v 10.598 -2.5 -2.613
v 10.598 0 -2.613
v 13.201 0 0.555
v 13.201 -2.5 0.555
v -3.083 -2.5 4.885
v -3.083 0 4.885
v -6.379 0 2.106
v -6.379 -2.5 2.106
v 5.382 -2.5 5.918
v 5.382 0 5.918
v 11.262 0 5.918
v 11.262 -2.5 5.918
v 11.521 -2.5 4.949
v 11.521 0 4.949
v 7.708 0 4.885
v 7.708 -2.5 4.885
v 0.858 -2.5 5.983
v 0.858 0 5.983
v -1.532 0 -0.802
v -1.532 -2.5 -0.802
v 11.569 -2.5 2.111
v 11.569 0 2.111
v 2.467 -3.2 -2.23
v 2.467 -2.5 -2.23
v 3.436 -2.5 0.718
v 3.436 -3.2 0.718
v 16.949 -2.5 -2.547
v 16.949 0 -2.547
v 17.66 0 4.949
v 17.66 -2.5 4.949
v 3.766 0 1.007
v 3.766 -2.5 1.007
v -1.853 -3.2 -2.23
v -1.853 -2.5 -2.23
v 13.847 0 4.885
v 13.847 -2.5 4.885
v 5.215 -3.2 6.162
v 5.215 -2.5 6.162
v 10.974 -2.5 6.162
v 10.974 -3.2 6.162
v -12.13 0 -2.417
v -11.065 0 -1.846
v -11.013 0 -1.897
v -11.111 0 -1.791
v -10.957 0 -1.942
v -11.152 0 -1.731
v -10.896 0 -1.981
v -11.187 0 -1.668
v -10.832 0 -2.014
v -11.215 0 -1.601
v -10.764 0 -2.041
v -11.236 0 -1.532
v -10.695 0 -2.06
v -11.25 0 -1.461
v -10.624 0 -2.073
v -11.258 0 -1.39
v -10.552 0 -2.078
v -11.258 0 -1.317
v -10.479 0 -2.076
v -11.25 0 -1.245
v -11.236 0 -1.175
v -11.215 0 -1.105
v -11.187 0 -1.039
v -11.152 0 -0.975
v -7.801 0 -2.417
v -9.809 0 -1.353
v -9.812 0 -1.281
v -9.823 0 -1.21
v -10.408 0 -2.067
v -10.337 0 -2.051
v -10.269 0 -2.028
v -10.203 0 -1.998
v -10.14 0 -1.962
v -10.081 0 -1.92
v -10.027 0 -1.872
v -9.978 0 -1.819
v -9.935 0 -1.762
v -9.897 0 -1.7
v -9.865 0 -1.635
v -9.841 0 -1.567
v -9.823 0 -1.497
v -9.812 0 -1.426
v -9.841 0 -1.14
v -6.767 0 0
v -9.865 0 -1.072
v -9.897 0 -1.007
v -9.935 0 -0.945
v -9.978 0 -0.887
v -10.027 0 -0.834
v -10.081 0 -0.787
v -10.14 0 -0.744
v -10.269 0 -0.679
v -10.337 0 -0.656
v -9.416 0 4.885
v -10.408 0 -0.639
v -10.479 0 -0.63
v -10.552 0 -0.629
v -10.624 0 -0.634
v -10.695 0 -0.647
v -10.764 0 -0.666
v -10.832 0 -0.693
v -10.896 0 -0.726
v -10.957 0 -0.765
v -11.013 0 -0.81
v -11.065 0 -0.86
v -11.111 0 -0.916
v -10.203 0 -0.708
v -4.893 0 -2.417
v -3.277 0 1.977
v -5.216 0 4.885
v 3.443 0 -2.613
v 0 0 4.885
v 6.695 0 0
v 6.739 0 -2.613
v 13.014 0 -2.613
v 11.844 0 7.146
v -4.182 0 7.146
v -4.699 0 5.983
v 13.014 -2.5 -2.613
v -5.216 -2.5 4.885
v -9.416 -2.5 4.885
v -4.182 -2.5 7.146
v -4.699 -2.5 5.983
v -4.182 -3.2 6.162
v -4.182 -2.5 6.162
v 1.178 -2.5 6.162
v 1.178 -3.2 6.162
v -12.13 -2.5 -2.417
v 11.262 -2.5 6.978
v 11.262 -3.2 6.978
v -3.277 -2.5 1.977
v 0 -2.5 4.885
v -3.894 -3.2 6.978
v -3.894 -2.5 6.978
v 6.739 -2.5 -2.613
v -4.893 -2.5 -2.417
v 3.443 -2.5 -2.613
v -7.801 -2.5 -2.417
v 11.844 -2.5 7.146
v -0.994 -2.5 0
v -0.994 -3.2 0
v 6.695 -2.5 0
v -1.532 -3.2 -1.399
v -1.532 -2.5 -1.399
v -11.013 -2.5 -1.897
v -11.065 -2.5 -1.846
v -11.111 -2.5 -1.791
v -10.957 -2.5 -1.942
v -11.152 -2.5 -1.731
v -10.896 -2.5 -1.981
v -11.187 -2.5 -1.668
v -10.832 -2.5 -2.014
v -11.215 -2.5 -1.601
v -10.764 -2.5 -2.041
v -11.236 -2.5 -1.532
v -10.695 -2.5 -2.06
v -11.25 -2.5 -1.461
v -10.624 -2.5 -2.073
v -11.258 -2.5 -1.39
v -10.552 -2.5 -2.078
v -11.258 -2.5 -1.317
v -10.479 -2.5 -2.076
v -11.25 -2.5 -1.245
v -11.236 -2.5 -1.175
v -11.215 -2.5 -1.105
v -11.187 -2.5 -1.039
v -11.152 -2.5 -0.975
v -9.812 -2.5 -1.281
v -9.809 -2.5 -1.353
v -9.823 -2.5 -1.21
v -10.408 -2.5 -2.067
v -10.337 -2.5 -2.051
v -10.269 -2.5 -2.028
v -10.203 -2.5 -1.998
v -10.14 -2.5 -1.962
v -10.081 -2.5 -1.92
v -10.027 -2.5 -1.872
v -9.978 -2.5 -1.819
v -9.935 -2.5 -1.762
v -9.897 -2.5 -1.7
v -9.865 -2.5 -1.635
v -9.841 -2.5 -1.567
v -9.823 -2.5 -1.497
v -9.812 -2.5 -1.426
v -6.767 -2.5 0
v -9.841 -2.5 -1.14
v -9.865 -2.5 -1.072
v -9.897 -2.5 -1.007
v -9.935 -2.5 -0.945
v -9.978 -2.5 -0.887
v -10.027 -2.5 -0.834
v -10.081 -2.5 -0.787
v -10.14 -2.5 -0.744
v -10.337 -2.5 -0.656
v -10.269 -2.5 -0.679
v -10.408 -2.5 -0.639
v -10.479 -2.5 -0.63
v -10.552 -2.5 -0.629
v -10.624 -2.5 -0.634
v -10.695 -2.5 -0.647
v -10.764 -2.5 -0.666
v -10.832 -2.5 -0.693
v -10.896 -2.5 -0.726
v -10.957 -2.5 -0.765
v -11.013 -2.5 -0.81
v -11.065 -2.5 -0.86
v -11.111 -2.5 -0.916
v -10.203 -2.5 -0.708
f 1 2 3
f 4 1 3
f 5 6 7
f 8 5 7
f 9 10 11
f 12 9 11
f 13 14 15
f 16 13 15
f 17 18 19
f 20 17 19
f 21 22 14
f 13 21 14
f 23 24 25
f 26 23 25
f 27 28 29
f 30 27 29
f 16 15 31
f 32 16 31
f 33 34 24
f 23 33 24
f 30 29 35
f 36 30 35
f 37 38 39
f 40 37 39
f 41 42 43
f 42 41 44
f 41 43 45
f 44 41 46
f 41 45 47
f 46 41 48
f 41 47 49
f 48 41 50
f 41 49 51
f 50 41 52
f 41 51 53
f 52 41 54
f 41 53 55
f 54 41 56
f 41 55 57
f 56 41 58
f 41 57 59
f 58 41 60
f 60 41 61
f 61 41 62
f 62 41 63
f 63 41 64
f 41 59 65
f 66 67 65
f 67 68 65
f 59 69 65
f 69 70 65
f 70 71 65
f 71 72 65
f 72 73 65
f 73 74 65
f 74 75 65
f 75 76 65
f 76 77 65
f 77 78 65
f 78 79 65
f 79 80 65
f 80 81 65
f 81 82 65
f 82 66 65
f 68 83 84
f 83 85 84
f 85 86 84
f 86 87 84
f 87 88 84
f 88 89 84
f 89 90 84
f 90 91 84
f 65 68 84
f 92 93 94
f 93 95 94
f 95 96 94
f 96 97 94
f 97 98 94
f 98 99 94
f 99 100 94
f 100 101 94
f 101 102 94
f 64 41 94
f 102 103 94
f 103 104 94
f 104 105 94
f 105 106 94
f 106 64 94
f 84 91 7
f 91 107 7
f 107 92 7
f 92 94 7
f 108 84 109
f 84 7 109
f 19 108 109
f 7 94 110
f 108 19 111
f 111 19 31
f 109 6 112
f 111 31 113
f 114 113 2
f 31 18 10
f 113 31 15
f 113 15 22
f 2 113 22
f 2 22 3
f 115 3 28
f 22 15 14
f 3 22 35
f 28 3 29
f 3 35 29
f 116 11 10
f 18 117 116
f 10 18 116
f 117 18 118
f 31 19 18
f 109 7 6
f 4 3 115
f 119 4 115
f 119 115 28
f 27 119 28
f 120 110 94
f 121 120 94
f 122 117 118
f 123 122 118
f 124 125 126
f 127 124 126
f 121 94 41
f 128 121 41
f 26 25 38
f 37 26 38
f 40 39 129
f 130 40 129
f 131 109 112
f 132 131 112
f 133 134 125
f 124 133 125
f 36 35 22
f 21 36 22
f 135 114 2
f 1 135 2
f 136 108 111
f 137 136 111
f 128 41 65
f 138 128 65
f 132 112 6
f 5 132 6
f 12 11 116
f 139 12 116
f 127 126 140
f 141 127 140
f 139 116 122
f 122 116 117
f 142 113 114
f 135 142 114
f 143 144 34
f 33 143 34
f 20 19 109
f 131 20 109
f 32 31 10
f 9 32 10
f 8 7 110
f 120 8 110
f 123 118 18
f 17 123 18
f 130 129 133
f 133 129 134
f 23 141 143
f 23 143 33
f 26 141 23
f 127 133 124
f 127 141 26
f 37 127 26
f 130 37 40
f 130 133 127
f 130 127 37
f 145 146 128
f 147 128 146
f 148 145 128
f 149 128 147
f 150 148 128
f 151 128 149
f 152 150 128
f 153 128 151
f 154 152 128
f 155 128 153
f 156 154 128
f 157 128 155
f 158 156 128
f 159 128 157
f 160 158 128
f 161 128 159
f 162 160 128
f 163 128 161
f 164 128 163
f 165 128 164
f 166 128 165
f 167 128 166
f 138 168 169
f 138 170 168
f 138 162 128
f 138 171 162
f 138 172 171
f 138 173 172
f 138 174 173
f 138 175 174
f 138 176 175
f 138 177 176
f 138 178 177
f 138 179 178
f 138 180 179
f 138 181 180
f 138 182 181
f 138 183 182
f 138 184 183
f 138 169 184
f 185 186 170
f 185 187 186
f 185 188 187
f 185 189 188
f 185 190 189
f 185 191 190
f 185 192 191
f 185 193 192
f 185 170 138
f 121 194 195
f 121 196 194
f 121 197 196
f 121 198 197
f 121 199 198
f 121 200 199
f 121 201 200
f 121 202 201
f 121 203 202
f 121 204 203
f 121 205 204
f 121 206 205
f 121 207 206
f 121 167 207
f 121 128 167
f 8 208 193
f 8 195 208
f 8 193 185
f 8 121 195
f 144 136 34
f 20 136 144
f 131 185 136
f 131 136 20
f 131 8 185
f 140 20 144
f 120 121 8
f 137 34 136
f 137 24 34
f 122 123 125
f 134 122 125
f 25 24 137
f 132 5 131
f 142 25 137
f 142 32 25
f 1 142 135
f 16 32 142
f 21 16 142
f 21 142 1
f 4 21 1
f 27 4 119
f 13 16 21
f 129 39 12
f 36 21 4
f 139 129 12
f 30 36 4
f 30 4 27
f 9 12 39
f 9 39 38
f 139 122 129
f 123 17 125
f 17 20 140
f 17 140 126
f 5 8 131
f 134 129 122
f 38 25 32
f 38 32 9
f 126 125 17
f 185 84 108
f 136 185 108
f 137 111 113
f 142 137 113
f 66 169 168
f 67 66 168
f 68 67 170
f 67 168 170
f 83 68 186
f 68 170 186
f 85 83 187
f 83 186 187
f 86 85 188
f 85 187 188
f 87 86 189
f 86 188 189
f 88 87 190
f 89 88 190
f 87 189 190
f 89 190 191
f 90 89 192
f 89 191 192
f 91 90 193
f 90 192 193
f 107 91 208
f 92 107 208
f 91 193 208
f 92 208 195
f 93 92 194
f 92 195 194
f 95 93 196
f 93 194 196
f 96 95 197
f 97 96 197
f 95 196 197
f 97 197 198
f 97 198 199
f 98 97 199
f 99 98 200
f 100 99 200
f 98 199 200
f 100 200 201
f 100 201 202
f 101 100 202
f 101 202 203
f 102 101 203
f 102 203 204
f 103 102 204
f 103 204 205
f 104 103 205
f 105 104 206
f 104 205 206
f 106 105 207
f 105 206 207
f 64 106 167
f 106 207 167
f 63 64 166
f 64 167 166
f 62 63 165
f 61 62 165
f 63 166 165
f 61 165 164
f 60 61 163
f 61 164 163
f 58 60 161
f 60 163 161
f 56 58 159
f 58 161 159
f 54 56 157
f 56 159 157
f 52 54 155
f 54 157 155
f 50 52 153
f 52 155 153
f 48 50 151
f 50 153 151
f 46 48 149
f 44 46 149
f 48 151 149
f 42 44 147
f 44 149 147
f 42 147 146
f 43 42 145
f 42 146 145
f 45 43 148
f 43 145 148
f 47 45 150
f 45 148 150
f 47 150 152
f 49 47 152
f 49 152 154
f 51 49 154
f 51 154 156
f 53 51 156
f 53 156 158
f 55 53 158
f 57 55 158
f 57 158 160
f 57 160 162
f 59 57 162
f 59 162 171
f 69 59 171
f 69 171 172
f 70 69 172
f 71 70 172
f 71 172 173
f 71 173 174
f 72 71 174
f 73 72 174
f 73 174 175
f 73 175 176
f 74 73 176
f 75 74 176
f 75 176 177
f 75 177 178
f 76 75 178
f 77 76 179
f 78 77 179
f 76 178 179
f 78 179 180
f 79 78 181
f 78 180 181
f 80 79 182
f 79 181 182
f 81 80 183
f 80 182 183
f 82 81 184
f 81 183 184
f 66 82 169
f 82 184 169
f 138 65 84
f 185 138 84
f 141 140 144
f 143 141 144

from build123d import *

# Parameters (mm, degrees)
F1_DEPTH = 2.5
F2_R     = 0.7249372234
F3_DEPTH = 2.5
F5_DEPTH = 0.7


with BuildPart() as f1:
    # F0 (on Front) → F1 (new body)
    with BuildSketch(Plane.XZ):
        Polygon((-9.4160782173, 4.8845554702), (-12.13010028, -2.4174565915), (-7.8005888499, -2.4174565915), (-6.7666755058, 0), (-4.8927078024, -2.4174565915), (3.4432173707, -2.6133938689), (6.6945207968, 0), (6.7388154566, -2.6133938689), (10.5981117284, -2.6133938689), (13.2007738575, 0.5550436326), (13.0135210928, -2.6133938689), (16.9487092644, -2.5466959924), (17.65952399, 4.9491748214), (13.846969232, 4.8845554702), (11.5687668393, 2.1111098447), (11.5206642076, 4.9491748214), (7.7081094496, 4.8845554702), (3.7663155235, 1.0073808953), (5.3818048909, 5.9184683487), (11.2621868029, 5.9184683487), (11.8437623605, 7.1462406777), (-4.1818926111, 7.1462406777), (-4.6988492832, 5.9830881655), (0.8584343595, 5.9830881655), (-1.5324898995, -0.8019671077), (-3.277218435, 1.9766744226), (0, 4.8845554702), (-3.0833596829, 4.8845554702), (-6.3789580017, 2.1059135906), (-5.2158059552, 4.8845554702), align=None)
    extrude(amount=F1_DEPTH)

    # F2 (on face) → F3 (cut, through all)
    with BuildSketch(Plane.XZ.offset(2.5)):
        with Locations((-10.5334725231, -1.3533922611)):
            Circle(F2_R)
    extrude(amount=-F3_DEPTH, mode=Mode.SUBTRACT)

    # F4 (on face) → F5 (join)
    with BuildSketch(Plane.XZ.offset(2.5)):
        Polygon((11.129762046, 6.9781923667), (-3.4941763151, 6.9781923667), (-3.7754920777, 6.9781923667), (-3.8937546778, 6.9781923667), (-4.1818926111, 6.1621805653), (-4.0636300109, 6.1621805653), (-1.2187248794, 6.1621805653), (1.055368688, 6.1621805653), (1.1777002364, 6.1621805653), (-0.993734838, 0), (-1.5324898995, -1.3987065759), (-1.8525599505, -2.2296669082), (2.4666503559, -2.2296669082), (3.4364298917, 0.7184627466), (5.2153817378, 6.1621805653), (5.4596047848, 6.1621805653), (10.9740488697, 6.1621805653), (11.2621868029, 6.9781923667), align=None)
    extrude(amount=F5_DEPTH)


solid = f1.part
